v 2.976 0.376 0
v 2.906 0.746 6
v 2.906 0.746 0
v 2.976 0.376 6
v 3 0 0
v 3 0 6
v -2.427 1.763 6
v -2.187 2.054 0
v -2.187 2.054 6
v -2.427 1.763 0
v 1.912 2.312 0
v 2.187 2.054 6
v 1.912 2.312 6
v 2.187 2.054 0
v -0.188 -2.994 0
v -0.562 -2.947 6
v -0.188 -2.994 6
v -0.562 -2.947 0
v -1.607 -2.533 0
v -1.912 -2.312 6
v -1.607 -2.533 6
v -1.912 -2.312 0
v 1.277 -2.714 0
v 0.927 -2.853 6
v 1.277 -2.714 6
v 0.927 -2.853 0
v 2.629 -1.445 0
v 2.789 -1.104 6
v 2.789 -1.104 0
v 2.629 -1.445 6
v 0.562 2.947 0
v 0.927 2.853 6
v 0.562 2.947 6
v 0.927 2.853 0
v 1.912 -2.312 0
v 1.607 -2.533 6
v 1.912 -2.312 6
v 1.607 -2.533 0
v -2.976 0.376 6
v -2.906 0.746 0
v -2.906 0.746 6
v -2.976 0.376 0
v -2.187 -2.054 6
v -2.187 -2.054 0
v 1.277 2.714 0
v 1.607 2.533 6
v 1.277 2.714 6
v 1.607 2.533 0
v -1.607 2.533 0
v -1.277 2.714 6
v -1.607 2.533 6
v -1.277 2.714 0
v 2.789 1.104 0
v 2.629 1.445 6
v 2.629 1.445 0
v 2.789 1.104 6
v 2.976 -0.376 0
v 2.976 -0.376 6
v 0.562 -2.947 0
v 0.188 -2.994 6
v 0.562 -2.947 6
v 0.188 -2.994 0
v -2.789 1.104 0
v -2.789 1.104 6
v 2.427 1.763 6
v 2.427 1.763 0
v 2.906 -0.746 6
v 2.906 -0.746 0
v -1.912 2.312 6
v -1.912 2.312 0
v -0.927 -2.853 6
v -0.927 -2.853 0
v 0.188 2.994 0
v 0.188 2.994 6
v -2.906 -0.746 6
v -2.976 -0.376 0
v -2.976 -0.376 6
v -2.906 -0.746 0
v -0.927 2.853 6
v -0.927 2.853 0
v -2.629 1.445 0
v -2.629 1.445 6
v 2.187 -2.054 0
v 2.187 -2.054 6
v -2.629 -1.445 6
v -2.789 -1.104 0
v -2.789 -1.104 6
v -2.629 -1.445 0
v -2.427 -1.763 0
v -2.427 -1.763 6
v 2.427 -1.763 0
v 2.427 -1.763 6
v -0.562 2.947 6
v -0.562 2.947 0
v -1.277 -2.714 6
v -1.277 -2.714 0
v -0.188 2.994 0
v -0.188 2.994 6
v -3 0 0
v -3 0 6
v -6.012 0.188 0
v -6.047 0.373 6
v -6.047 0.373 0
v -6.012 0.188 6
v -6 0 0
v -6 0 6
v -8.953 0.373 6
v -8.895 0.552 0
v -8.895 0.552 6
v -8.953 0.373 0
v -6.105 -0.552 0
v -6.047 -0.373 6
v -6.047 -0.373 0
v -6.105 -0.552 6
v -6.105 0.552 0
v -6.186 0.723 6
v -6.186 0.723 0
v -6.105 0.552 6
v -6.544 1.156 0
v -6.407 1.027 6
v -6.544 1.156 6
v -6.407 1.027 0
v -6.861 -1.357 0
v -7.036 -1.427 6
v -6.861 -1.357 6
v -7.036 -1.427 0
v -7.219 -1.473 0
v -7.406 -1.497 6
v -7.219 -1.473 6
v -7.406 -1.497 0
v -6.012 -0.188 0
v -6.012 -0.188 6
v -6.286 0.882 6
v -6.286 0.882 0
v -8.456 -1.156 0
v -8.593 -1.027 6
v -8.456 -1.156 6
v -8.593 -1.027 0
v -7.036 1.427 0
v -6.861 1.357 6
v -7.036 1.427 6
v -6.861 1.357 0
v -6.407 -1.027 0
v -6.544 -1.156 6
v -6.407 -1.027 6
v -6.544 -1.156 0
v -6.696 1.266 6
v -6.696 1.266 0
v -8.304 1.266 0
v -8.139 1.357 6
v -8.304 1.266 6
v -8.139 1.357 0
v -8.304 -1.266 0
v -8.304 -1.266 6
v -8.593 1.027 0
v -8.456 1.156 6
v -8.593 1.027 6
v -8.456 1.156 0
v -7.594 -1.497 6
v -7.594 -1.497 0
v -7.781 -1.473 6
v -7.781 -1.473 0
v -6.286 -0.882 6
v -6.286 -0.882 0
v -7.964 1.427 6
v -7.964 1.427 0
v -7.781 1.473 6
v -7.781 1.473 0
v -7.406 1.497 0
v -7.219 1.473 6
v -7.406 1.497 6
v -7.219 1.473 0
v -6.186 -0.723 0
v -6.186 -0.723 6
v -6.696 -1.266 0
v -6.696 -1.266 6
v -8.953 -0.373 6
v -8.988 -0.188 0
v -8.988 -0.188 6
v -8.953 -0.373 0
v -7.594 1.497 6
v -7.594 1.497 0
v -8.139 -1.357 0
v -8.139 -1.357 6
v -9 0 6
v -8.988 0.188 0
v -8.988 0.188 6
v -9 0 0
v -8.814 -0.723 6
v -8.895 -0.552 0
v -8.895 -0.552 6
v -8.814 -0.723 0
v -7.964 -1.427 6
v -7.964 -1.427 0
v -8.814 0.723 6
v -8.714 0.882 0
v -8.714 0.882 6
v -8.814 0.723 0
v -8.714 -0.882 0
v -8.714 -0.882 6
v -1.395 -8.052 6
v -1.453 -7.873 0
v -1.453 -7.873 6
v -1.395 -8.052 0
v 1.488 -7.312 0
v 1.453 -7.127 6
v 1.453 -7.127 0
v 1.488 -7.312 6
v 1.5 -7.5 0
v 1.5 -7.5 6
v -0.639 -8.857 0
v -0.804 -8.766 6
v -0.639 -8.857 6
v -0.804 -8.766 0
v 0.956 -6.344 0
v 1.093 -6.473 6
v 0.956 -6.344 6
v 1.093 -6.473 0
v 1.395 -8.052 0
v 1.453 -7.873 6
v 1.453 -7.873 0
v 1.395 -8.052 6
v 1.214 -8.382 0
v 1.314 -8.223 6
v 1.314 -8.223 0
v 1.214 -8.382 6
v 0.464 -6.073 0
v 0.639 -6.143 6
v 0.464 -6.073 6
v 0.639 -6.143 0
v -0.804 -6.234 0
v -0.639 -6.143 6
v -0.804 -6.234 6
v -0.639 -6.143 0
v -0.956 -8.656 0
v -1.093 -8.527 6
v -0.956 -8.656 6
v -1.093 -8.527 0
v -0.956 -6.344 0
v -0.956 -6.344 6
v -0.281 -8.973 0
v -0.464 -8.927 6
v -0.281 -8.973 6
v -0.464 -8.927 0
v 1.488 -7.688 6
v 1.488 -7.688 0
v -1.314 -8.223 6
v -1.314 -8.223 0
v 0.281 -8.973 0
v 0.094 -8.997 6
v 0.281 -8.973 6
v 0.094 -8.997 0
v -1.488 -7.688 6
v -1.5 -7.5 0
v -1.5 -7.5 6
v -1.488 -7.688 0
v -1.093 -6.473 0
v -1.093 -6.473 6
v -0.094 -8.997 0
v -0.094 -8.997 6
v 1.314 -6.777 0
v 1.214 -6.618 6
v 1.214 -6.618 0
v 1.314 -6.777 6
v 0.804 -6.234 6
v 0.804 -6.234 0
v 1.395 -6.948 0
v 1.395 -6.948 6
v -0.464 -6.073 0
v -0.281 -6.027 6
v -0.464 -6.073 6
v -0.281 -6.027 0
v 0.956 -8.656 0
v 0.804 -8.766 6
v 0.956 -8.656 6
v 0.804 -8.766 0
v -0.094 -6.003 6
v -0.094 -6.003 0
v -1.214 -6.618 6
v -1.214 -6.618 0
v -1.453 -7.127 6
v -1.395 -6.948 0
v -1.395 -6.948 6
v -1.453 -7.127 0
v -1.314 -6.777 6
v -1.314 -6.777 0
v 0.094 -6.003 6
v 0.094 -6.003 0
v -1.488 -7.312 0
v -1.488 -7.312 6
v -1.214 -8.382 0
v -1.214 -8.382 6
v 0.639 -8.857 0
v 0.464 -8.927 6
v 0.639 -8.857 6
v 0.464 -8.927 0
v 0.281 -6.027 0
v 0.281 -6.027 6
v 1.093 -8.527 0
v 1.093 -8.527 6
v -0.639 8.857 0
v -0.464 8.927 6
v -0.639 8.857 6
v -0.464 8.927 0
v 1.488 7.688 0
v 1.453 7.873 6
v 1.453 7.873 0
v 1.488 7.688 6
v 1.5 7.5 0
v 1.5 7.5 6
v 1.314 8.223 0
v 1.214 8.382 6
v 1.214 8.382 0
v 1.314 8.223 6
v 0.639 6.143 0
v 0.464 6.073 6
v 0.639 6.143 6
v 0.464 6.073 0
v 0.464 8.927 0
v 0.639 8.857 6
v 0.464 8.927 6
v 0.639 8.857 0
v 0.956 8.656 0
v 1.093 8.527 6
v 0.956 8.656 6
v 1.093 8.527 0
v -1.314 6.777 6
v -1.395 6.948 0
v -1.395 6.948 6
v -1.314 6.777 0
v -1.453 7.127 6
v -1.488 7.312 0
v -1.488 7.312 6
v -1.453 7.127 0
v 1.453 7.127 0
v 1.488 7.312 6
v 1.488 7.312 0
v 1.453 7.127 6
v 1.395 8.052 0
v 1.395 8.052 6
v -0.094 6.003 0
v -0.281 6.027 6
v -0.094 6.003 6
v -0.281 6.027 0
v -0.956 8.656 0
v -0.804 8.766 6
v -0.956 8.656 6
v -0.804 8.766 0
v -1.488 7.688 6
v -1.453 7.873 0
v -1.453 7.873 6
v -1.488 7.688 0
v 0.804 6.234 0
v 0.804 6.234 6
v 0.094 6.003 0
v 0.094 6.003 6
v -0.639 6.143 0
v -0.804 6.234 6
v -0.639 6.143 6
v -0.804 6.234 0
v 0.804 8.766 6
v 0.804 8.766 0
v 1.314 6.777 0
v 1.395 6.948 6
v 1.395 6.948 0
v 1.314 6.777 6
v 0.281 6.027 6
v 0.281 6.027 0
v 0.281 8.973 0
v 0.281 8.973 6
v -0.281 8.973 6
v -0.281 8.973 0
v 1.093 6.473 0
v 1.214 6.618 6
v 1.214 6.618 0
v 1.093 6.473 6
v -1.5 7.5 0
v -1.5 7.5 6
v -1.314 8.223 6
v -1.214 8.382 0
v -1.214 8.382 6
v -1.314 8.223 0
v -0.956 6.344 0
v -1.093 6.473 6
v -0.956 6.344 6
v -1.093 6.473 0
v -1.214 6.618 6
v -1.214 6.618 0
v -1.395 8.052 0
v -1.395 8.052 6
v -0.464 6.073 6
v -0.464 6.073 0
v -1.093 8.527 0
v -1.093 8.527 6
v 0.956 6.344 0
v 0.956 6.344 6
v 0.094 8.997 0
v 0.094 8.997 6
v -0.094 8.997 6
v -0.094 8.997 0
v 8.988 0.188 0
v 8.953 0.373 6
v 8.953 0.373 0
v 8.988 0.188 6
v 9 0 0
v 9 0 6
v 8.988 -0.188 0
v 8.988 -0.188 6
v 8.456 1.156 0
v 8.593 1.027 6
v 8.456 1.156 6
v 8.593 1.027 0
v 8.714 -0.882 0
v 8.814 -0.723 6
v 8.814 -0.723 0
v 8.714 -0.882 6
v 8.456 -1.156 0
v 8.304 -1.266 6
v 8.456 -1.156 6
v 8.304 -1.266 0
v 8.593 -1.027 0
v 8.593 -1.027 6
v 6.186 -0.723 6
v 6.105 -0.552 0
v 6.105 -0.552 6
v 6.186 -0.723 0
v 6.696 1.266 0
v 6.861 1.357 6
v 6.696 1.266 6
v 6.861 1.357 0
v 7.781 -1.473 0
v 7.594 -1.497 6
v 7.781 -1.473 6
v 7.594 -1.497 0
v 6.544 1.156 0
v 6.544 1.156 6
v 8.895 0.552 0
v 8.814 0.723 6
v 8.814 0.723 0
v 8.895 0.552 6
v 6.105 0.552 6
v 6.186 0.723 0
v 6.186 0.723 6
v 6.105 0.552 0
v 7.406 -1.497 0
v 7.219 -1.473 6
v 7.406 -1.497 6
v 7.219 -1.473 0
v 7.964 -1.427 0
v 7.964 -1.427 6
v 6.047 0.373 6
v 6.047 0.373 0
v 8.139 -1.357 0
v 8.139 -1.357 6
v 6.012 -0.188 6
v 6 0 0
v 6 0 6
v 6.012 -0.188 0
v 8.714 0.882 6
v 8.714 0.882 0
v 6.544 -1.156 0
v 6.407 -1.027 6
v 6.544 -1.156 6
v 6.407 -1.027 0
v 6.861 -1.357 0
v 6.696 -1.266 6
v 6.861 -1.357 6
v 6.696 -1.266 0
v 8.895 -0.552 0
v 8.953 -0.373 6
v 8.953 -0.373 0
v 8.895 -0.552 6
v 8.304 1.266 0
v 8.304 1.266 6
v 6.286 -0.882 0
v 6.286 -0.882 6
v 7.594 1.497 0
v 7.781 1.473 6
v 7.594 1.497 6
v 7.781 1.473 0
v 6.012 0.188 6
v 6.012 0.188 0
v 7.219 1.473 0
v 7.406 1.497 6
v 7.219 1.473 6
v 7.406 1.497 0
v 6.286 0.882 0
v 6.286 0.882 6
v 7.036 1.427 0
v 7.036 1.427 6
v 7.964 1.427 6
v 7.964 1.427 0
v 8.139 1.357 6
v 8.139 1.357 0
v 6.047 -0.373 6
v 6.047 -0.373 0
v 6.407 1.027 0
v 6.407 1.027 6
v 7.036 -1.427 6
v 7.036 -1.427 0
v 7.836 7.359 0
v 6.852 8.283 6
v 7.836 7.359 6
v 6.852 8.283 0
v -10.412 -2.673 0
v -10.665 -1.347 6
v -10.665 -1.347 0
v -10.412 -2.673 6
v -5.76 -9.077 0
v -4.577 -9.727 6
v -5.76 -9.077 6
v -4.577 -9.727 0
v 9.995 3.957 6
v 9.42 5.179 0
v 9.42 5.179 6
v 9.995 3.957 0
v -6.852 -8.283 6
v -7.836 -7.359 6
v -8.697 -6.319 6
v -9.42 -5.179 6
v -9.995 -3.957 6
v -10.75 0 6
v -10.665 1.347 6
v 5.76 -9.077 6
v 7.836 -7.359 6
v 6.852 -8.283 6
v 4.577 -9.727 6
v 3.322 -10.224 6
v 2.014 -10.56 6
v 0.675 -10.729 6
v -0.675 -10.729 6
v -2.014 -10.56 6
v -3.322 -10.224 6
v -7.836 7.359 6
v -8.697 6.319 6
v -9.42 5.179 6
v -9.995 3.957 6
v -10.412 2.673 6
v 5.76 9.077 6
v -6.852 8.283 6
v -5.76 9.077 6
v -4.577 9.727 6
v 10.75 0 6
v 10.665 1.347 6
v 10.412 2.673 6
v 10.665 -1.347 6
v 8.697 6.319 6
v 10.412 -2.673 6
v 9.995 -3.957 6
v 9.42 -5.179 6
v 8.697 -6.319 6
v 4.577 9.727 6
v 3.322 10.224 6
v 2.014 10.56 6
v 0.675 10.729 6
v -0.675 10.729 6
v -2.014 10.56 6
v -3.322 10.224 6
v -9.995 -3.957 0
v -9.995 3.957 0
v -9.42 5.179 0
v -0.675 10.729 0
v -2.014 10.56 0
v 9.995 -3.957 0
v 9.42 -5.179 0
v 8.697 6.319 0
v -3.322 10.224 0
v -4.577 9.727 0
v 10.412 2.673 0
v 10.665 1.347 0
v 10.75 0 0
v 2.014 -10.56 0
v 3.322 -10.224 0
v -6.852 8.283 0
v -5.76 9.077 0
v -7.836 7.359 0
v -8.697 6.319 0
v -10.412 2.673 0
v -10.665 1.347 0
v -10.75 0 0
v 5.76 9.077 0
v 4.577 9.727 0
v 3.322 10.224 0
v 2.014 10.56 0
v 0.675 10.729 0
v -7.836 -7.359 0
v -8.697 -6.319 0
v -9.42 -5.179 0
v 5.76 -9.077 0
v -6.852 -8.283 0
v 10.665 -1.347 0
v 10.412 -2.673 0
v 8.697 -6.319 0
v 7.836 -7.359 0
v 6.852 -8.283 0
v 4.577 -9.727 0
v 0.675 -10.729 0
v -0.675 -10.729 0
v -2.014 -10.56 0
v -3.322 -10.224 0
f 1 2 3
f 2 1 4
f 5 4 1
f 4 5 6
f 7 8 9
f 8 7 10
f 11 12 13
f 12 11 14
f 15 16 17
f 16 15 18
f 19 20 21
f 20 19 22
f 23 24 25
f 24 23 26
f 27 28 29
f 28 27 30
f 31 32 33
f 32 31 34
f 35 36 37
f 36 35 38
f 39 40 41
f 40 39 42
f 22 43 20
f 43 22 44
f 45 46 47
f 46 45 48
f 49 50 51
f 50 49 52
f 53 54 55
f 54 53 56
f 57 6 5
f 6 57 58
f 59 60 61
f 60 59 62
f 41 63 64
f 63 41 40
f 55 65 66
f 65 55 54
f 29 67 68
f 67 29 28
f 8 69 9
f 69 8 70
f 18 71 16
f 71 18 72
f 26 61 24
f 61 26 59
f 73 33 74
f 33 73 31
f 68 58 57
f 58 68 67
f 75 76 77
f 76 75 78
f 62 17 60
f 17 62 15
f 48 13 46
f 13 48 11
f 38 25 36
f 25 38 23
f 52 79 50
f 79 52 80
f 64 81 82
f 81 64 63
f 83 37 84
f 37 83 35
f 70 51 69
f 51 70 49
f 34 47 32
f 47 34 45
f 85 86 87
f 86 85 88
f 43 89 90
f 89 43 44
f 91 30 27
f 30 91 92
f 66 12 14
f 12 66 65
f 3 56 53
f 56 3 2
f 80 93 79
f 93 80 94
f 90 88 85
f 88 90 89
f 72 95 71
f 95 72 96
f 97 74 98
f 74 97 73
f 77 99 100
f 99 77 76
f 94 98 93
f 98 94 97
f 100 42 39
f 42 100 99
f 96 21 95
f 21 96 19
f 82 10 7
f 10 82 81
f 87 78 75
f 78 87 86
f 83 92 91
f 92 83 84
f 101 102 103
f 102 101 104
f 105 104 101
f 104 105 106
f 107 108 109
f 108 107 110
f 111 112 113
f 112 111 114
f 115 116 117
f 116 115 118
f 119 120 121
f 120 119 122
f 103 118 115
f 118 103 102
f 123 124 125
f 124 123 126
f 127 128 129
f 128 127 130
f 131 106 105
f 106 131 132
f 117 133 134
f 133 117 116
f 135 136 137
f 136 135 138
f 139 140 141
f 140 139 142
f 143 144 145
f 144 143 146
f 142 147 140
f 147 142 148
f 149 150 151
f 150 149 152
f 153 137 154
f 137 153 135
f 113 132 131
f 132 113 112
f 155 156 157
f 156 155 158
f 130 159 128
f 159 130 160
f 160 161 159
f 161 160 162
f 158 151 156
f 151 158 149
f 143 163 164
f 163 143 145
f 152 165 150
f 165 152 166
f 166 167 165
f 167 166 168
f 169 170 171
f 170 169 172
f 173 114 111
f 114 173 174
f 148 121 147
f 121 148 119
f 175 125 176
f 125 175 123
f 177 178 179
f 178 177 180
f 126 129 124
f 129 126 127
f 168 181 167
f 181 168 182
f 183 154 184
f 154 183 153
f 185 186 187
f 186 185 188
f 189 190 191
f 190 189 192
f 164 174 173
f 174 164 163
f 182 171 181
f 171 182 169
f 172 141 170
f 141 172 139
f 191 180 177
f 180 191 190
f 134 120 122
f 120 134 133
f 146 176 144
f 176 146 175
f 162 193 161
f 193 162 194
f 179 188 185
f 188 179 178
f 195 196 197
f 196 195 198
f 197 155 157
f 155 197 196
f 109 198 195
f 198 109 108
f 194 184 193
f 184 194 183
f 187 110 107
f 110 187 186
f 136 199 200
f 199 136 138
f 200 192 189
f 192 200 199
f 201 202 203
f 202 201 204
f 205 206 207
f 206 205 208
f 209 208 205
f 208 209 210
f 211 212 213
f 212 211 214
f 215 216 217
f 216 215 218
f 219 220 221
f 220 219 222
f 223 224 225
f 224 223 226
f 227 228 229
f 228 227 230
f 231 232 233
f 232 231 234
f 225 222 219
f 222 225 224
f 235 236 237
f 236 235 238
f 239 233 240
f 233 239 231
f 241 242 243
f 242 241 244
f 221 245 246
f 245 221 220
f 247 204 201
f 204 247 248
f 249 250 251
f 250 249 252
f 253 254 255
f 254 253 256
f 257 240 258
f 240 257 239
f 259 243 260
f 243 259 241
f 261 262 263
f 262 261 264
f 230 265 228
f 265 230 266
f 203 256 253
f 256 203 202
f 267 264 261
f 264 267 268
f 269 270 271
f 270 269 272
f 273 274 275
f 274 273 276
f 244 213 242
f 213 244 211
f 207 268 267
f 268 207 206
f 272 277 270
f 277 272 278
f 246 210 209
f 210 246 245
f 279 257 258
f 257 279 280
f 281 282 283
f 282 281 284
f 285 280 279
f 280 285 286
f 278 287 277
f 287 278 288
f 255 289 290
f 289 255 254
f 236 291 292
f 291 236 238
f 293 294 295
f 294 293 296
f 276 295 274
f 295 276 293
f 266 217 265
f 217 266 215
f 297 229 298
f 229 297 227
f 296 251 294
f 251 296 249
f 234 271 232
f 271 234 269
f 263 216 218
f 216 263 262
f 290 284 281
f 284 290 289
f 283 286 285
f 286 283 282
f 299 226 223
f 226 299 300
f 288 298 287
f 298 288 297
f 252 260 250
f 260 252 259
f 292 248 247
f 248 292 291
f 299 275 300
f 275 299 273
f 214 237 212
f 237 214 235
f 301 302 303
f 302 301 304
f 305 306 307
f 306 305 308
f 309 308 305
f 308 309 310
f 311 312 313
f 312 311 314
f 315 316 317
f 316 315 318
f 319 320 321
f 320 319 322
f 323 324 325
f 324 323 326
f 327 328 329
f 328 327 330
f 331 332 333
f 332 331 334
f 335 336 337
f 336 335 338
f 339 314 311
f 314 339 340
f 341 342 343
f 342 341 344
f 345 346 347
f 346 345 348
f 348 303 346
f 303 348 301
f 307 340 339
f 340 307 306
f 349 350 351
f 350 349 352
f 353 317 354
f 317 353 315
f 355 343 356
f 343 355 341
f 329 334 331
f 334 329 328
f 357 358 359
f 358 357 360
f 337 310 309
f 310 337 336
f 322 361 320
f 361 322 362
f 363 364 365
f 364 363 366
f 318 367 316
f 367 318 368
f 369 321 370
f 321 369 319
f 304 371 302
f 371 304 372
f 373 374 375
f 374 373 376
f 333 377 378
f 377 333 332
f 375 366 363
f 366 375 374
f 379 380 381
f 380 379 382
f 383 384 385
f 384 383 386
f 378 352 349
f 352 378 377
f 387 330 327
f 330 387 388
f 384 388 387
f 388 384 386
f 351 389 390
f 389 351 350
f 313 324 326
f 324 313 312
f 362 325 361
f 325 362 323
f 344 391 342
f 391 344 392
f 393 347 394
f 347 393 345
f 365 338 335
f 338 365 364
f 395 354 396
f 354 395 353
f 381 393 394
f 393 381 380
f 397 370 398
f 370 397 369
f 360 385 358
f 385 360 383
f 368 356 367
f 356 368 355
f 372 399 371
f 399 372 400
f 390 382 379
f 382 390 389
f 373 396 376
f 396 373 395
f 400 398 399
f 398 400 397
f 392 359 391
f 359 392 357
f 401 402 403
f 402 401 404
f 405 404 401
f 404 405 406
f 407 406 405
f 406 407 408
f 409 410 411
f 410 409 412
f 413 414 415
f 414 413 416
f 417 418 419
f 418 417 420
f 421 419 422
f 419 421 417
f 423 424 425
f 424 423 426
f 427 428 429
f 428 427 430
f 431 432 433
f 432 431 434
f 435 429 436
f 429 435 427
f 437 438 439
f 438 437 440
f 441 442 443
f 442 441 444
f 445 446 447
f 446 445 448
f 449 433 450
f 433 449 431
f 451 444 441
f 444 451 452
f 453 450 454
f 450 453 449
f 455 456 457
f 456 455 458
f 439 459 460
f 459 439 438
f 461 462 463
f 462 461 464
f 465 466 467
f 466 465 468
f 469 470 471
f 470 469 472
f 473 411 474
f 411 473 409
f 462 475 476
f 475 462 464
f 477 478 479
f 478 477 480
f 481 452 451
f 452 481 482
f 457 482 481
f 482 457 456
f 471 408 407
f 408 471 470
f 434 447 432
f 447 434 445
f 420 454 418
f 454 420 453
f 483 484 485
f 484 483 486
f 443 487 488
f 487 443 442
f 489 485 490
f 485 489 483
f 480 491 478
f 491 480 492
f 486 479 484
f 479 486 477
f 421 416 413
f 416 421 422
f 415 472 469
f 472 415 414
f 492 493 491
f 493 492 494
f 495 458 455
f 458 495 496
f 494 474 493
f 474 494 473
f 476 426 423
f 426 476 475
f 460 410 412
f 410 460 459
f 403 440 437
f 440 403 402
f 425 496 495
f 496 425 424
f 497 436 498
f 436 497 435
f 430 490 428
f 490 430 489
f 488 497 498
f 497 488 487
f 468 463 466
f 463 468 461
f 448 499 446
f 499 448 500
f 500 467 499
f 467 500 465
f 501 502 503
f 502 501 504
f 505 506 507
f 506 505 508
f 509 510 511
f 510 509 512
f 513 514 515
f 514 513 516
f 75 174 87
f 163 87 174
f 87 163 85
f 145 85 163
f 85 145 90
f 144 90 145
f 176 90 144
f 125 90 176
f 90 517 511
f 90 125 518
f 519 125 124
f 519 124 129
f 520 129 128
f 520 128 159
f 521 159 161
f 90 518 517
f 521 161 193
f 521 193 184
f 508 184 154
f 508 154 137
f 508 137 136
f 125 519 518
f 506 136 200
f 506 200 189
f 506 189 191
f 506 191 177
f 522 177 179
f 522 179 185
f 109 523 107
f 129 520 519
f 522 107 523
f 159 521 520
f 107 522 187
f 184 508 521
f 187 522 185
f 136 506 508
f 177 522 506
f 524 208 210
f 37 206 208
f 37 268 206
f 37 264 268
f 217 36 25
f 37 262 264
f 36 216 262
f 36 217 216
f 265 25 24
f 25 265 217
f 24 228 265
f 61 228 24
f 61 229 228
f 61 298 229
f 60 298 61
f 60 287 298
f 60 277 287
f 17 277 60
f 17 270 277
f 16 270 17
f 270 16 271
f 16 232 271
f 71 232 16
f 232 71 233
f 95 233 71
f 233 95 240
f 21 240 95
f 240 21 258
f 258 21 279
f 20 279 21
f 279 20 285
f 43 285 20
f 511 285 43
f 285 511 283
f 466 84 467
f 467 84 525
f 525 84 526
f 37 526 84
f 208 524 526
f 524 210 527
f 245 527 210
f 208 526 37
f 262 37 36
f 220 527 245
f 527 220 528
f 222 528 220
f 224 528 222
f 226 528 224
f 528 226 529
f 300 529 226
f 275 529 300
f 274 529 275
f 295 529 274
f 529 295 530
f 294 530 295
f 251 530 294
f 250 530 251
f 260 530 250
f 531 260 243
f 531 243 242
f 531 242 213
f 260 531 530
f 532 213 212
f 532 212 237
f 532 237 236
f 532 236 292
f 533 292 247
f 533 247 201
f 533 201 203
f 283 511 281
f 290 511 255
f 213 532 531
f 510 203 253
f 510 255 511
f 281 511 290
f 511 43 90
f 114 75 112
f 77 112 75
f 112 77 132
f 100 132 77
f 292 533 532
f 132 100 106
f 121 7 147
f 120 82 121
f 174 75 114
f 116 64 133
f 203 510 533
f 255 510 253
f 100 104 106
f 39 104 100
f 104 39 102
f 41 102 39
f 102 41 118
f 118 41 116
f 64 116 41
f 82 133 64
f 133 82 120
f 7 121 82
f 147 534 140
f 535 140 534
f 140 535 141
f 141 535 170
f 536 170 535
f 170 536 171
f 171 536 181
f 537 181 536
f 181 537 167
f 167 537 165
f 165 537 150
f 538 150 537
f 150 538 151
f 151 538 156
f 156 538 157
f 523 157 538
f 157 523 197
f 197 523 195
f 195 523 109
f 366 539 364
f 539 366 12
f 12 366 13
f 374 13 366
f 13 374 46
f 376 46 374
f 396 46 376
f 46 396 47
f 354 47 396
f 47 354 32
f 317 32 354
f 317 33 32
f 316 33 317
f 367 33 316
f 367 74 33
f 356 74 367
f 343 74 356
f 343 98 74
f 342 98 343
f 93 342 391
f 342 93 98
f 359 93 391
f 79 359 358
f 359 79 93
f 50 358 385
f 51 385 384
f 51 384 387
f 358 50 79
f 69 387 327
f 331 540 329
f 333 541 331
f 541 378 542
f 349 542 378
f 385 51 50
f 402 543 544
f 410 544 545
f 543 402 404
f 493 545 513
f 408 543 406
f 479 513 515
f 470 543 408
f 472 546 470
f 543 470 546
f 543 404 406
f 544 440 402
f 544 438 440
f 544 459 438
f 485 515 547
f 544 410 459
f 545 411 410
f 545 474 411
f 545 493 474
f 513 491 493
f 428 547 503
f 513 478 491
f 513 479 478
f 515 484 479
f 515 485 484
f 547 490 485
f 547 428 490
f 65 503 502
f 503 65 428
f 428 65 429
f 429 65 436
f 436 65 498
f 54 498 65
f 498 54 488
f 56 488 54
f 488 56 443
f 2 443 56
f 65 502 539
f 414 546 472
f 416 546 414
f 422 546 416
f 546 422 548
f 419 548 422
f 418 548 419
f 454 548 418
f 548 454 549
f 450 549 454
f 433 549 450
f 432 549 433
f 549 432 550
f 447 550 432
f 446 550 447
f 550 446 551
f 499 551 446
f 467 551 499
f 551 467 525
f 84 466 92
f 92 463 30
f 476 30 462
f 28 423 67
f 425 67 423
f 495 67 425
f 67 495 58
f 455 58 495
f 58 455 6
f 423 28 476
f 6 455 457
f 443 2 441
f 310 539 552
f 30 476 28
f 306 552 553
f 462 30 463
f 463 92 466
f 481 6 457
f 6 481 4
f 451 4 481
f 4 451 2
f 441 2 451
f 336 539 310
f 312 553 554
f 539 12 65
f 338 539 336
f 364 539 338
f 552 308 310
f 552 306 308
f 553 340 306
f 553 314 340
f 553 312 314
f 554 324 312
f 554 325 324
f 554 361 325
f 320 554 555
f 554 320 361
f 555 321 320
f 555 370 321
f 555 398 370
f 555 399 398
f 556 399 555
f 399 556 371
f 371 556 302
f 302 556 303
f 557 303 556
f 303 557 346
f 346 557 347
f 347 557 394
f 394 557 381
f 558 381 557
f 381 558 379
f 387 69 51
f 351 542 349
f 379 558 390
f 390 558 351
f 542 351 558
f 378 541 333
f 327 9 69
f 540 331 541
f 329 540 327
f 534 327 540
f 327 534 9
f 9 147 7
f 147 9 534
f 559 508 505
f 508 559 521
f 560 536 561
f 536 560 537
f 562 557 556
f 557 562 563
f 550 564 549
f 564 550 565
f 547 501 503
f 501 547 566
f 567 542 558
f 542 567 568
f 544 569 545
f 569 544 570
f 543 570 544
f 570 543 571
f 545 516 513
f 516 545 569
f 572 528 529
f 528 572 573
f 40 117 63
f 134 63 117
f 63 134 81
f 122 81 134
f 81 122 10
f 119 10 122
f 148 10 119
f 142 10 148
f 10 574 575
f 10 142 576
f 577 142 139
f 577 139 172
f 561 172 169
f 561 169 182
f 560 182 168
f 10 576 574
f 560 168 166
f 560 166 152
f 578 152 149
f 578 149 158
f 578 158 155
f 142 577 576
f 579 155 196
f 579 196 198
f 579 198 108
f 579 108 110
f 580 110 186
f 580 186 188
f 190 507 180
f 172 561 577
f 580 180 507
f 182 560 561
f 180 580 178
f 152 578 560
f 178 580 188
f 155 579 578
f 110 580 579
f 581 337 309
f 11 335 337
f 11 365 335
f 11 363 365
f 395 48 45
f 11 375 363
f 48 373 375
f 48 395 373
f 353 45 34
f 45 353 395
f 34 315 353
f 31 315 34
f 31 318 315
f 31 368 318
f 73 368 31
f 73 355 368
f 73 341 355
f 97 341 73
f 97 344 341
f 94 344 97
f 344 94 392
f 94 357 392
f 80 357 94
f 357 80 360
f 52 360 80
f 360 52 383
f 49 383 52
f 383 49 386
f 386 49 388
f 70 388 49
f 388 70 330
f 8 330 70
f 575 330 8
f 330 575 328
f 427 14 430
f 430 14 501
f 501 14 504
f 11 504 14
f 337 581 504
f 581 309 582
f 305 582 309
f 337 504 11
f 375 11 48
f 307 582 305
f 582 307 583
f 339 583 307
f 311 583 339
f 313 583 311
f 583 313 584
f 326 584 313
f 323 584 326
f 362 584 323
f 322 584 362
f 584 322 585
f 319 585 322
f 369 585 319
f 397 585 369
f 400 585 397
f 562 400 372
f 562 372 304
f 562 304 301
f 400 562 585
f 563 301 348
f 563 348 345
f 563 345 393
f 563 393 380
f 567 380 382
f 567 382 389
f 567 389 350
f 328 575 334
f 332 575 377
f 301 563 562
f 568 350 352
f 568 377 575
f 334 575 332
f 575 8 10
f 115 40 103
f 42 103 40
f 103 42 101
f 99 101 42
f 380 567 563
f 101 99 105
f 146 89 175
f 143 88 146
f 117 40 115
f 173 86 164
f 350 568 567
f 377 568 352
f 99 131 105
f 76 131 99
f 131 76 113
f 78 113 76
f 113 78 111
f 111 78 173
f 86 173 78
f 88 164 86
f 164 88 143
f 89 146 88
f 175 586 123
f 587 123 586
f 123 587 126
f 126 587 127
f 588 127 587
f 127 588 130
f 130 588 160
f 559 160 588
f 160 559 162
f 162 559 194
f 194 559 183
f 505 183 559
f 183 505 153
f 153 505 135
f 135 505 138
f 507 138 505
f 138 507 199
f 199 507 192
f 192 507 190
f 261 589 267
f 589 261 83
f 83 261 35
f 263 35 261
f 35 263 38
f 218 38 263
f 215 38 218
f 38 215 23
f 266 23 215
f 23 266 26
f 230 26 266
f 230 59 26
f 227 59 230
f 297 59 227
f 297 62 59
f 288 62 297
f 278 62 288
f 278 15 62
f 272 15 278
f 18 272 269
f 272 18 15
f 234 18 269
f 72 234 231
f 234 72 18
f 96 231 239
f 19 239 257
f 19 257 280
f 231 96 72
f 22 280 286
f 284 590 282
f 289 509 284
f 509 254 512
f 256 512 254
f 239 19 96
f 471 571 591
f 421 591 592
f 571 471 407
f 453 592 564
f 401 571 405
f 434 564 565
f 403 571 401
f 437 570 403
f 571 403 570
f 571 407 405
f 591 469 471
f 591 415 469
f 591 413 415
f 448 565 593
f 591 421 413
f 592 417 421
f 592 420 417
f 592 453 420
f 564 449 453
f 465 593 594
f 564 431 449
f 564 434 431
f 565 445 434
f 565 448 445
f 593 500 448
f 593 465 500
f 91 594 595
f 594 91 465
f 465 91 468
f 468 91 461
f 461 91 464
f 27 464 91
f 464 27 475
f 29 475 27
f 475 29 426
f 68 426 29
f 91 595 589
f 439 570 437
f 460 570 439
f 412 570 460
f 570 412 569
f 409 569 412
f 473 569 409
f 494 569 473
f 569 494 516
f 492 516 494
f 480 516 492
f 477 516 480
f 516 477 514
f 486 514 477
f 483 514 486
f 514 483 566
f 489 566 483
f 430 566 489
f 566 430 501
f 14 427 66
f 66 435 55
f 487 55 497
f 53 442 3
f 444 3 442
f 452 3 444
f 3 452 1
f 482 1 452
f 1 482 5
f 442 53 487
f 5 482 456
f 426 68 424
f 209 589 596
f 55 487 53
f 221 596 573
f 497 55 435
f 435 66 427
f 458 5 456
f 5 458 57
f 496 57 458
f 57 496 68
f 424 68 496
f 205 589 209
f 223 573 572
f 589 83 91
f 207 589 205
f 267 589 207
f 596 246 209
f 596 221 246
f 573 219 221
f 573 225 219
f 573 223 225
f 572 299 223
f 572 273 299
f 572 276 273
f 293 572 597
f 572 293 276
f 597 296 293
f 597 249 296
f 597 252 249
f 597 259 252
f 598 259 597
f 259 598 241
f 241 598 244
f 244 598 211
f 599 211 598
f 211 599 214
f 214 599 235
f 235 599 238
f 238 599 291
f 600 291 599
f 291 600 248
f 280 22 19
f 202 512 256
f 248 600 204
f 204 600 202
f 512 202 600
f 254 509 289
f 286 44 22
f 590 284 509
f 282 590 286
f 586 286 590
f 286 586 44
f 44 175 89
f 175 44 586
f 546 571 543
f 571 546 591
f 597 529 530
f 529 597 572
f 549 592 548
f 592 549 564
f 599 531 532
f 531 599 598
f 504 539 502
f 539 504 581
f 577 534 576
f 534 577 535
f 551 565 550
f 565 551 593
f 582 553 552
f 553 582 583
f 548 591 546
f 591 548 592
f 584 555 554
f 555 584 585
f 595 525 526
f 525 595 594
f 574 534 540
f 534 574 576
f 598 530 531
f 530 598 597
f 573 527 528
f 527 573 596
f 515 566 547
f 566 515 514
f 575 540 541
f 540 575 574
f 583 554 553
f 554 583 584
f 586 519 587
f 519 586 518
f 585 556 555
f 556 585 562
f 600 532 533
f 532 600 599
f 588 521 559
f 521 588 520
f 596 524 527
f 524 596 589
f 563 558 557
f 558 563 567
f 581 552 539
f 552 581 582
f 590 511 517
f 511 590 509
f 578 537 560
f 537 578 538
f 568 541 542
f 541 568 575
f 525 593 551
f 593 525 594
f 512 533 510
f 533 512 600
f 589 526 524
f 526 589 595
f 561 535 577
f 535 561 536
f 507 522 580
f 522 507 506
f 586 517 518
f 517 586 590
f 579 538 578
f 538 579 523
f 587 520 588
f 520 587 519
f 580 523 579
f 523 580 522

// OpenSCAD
$fn = 50;


difference() {
	union() {
		*color(alpha = 1.0000000000, c = "gray") {
			translate(v = [0, 7, 0]) {
				linear_extrude(height = 1) {
					text(font = "Arial:style=Bold", halign = "center", size = 4.5000000000, text = "COMMENT circle main", valign = "center");
				}
			}
		}
		*color(alpha = 1.0000000000, c = "gray") {
			translate(v = [0, 14, 0]) {
				linear_extrude(height = 1.5000000000) {
					text(font = "Arial:style=Bold", halign = "center", size = 4.5000000000, text = "COMMENT description oobb_circle_shape_p_type_6_depth_1.5_diameter_6_thickness_1.5_width_1.5_height", valign = "center");
				}
			}
		}
		cylinder(h = 6, r = 10.7500000000);
	}
	union() {
		*color(alpha = 1.0000000000, c = "gray") {
			translate(v = [0, 7, 0]) {
				linear_extrude(height = 1) {
					text(font = "Arial:style=Bold", halign = "center", size = 4.5000000000, text = "COMMENT holes main", valign = "center");
				}
			}
		}
		*color(alpha = 1.0000000000, c = "gray") {
			translate(v = [0, 14, 0]) {
				linear_extrude(height = 1.5000000000) {
					text(font = "Arial:style=Bold", halign = "center", size = 4.5000000000, text = "COMMENT description oobb_holes_shape_n_type_1.5_diameter_6_thickness_1.5_width_1.5_height_true_both_holes_true_circle", valign = "center");
				}
			}
		}
		translate(v = [0.0000000000, 0.0000000000, -50.0000000000]) {
			cylinder(h = 100, r = 3.0000000000);
		}
		translate(v = [0.0000000000, 0.0000000000, -50.0000000000]) {
			cylinder(h = 100, r = 3.0000000000);
		}
		translate(v = [0.0000000000, 0.0000000000, -50.0000000000]) {
			cylinder(h = 100, r = 3.0000000000);
		}
		translate(v = [-7.5000000000, 0.0000000000, -50.0000000000]) {
			cylinder(h = 100, r = 1.5000000000);
		}
		translate(v = [0.0000000000, -7.5000000000, -50.0000000000]) {
			cylinder(h = 100, r = 1.5000000000);
		}
		translate(v = [0.0000000000, 0.0000000000, -50.0000000000]) {
			cylinder(h = 100, r = 1.5000000000);
		}
		translate(v = [0.0000000000, 7.5000000000, -50.0000000000]) {
			cylinder(h = 100, r = 1.5000000000);
		}
		translate(v = [7.5000000000, 0.0000000000, -50.0000000000]) {
			cylinder(h = 100, r = 1.5000000000);
		}
		translate(v = [-7.5000000000, 0.0000000000, -50.0000000000]) {
			cylinder(h = 100, r = 1.5000000000);
		}
		translate(v = [0.0000000000, -7.5000000000, -50.0000000000]) {
			cylinder(h = 100, r = 1.5000000000);
		}
		translate(v = [0.0000000000, 0.0000000000, -50.0000000000]) {
			cylinder(h = 100, r = 1.5000000000);
		}
		translate(v = [0.0000000000, 7.5000000000, -50.0000000000]) {
			cylinder(h = 100, r = 1.5000000000);
		}
		translate(v = [7.5000000000, 0.0000000000, -50.0000000000]) {
			cylinder(h = 100, r = 1.5000000000);
		}
		translate(v = [-7.5000000000, 0.0000000000, -50.0000000000]) {
			cylinder(h = 100, r = 1.5000000000);
		}
		translate(v = [0.0000000000, -7.5000000000, -50.0000000000]) {
			cylinder(h = 100, r = 1.5000000000);
		}
		translate(v = [0.0000000000, 0.0000000000, -50.0000000000]) {
			cylinder(h = 100, r = 1.5000000000);
		}
		translate(v = [0.0000000000, 7.5000000000, -50.0000000000]) {
			cylinder(h = 100, r = 1.5000000000);
		}
		translate(v = [7.5000000000, 0.0000000000, -50.0000000000]) {
			cylinder(h = 100, r = 1.5000000000);
		}
	}
}
